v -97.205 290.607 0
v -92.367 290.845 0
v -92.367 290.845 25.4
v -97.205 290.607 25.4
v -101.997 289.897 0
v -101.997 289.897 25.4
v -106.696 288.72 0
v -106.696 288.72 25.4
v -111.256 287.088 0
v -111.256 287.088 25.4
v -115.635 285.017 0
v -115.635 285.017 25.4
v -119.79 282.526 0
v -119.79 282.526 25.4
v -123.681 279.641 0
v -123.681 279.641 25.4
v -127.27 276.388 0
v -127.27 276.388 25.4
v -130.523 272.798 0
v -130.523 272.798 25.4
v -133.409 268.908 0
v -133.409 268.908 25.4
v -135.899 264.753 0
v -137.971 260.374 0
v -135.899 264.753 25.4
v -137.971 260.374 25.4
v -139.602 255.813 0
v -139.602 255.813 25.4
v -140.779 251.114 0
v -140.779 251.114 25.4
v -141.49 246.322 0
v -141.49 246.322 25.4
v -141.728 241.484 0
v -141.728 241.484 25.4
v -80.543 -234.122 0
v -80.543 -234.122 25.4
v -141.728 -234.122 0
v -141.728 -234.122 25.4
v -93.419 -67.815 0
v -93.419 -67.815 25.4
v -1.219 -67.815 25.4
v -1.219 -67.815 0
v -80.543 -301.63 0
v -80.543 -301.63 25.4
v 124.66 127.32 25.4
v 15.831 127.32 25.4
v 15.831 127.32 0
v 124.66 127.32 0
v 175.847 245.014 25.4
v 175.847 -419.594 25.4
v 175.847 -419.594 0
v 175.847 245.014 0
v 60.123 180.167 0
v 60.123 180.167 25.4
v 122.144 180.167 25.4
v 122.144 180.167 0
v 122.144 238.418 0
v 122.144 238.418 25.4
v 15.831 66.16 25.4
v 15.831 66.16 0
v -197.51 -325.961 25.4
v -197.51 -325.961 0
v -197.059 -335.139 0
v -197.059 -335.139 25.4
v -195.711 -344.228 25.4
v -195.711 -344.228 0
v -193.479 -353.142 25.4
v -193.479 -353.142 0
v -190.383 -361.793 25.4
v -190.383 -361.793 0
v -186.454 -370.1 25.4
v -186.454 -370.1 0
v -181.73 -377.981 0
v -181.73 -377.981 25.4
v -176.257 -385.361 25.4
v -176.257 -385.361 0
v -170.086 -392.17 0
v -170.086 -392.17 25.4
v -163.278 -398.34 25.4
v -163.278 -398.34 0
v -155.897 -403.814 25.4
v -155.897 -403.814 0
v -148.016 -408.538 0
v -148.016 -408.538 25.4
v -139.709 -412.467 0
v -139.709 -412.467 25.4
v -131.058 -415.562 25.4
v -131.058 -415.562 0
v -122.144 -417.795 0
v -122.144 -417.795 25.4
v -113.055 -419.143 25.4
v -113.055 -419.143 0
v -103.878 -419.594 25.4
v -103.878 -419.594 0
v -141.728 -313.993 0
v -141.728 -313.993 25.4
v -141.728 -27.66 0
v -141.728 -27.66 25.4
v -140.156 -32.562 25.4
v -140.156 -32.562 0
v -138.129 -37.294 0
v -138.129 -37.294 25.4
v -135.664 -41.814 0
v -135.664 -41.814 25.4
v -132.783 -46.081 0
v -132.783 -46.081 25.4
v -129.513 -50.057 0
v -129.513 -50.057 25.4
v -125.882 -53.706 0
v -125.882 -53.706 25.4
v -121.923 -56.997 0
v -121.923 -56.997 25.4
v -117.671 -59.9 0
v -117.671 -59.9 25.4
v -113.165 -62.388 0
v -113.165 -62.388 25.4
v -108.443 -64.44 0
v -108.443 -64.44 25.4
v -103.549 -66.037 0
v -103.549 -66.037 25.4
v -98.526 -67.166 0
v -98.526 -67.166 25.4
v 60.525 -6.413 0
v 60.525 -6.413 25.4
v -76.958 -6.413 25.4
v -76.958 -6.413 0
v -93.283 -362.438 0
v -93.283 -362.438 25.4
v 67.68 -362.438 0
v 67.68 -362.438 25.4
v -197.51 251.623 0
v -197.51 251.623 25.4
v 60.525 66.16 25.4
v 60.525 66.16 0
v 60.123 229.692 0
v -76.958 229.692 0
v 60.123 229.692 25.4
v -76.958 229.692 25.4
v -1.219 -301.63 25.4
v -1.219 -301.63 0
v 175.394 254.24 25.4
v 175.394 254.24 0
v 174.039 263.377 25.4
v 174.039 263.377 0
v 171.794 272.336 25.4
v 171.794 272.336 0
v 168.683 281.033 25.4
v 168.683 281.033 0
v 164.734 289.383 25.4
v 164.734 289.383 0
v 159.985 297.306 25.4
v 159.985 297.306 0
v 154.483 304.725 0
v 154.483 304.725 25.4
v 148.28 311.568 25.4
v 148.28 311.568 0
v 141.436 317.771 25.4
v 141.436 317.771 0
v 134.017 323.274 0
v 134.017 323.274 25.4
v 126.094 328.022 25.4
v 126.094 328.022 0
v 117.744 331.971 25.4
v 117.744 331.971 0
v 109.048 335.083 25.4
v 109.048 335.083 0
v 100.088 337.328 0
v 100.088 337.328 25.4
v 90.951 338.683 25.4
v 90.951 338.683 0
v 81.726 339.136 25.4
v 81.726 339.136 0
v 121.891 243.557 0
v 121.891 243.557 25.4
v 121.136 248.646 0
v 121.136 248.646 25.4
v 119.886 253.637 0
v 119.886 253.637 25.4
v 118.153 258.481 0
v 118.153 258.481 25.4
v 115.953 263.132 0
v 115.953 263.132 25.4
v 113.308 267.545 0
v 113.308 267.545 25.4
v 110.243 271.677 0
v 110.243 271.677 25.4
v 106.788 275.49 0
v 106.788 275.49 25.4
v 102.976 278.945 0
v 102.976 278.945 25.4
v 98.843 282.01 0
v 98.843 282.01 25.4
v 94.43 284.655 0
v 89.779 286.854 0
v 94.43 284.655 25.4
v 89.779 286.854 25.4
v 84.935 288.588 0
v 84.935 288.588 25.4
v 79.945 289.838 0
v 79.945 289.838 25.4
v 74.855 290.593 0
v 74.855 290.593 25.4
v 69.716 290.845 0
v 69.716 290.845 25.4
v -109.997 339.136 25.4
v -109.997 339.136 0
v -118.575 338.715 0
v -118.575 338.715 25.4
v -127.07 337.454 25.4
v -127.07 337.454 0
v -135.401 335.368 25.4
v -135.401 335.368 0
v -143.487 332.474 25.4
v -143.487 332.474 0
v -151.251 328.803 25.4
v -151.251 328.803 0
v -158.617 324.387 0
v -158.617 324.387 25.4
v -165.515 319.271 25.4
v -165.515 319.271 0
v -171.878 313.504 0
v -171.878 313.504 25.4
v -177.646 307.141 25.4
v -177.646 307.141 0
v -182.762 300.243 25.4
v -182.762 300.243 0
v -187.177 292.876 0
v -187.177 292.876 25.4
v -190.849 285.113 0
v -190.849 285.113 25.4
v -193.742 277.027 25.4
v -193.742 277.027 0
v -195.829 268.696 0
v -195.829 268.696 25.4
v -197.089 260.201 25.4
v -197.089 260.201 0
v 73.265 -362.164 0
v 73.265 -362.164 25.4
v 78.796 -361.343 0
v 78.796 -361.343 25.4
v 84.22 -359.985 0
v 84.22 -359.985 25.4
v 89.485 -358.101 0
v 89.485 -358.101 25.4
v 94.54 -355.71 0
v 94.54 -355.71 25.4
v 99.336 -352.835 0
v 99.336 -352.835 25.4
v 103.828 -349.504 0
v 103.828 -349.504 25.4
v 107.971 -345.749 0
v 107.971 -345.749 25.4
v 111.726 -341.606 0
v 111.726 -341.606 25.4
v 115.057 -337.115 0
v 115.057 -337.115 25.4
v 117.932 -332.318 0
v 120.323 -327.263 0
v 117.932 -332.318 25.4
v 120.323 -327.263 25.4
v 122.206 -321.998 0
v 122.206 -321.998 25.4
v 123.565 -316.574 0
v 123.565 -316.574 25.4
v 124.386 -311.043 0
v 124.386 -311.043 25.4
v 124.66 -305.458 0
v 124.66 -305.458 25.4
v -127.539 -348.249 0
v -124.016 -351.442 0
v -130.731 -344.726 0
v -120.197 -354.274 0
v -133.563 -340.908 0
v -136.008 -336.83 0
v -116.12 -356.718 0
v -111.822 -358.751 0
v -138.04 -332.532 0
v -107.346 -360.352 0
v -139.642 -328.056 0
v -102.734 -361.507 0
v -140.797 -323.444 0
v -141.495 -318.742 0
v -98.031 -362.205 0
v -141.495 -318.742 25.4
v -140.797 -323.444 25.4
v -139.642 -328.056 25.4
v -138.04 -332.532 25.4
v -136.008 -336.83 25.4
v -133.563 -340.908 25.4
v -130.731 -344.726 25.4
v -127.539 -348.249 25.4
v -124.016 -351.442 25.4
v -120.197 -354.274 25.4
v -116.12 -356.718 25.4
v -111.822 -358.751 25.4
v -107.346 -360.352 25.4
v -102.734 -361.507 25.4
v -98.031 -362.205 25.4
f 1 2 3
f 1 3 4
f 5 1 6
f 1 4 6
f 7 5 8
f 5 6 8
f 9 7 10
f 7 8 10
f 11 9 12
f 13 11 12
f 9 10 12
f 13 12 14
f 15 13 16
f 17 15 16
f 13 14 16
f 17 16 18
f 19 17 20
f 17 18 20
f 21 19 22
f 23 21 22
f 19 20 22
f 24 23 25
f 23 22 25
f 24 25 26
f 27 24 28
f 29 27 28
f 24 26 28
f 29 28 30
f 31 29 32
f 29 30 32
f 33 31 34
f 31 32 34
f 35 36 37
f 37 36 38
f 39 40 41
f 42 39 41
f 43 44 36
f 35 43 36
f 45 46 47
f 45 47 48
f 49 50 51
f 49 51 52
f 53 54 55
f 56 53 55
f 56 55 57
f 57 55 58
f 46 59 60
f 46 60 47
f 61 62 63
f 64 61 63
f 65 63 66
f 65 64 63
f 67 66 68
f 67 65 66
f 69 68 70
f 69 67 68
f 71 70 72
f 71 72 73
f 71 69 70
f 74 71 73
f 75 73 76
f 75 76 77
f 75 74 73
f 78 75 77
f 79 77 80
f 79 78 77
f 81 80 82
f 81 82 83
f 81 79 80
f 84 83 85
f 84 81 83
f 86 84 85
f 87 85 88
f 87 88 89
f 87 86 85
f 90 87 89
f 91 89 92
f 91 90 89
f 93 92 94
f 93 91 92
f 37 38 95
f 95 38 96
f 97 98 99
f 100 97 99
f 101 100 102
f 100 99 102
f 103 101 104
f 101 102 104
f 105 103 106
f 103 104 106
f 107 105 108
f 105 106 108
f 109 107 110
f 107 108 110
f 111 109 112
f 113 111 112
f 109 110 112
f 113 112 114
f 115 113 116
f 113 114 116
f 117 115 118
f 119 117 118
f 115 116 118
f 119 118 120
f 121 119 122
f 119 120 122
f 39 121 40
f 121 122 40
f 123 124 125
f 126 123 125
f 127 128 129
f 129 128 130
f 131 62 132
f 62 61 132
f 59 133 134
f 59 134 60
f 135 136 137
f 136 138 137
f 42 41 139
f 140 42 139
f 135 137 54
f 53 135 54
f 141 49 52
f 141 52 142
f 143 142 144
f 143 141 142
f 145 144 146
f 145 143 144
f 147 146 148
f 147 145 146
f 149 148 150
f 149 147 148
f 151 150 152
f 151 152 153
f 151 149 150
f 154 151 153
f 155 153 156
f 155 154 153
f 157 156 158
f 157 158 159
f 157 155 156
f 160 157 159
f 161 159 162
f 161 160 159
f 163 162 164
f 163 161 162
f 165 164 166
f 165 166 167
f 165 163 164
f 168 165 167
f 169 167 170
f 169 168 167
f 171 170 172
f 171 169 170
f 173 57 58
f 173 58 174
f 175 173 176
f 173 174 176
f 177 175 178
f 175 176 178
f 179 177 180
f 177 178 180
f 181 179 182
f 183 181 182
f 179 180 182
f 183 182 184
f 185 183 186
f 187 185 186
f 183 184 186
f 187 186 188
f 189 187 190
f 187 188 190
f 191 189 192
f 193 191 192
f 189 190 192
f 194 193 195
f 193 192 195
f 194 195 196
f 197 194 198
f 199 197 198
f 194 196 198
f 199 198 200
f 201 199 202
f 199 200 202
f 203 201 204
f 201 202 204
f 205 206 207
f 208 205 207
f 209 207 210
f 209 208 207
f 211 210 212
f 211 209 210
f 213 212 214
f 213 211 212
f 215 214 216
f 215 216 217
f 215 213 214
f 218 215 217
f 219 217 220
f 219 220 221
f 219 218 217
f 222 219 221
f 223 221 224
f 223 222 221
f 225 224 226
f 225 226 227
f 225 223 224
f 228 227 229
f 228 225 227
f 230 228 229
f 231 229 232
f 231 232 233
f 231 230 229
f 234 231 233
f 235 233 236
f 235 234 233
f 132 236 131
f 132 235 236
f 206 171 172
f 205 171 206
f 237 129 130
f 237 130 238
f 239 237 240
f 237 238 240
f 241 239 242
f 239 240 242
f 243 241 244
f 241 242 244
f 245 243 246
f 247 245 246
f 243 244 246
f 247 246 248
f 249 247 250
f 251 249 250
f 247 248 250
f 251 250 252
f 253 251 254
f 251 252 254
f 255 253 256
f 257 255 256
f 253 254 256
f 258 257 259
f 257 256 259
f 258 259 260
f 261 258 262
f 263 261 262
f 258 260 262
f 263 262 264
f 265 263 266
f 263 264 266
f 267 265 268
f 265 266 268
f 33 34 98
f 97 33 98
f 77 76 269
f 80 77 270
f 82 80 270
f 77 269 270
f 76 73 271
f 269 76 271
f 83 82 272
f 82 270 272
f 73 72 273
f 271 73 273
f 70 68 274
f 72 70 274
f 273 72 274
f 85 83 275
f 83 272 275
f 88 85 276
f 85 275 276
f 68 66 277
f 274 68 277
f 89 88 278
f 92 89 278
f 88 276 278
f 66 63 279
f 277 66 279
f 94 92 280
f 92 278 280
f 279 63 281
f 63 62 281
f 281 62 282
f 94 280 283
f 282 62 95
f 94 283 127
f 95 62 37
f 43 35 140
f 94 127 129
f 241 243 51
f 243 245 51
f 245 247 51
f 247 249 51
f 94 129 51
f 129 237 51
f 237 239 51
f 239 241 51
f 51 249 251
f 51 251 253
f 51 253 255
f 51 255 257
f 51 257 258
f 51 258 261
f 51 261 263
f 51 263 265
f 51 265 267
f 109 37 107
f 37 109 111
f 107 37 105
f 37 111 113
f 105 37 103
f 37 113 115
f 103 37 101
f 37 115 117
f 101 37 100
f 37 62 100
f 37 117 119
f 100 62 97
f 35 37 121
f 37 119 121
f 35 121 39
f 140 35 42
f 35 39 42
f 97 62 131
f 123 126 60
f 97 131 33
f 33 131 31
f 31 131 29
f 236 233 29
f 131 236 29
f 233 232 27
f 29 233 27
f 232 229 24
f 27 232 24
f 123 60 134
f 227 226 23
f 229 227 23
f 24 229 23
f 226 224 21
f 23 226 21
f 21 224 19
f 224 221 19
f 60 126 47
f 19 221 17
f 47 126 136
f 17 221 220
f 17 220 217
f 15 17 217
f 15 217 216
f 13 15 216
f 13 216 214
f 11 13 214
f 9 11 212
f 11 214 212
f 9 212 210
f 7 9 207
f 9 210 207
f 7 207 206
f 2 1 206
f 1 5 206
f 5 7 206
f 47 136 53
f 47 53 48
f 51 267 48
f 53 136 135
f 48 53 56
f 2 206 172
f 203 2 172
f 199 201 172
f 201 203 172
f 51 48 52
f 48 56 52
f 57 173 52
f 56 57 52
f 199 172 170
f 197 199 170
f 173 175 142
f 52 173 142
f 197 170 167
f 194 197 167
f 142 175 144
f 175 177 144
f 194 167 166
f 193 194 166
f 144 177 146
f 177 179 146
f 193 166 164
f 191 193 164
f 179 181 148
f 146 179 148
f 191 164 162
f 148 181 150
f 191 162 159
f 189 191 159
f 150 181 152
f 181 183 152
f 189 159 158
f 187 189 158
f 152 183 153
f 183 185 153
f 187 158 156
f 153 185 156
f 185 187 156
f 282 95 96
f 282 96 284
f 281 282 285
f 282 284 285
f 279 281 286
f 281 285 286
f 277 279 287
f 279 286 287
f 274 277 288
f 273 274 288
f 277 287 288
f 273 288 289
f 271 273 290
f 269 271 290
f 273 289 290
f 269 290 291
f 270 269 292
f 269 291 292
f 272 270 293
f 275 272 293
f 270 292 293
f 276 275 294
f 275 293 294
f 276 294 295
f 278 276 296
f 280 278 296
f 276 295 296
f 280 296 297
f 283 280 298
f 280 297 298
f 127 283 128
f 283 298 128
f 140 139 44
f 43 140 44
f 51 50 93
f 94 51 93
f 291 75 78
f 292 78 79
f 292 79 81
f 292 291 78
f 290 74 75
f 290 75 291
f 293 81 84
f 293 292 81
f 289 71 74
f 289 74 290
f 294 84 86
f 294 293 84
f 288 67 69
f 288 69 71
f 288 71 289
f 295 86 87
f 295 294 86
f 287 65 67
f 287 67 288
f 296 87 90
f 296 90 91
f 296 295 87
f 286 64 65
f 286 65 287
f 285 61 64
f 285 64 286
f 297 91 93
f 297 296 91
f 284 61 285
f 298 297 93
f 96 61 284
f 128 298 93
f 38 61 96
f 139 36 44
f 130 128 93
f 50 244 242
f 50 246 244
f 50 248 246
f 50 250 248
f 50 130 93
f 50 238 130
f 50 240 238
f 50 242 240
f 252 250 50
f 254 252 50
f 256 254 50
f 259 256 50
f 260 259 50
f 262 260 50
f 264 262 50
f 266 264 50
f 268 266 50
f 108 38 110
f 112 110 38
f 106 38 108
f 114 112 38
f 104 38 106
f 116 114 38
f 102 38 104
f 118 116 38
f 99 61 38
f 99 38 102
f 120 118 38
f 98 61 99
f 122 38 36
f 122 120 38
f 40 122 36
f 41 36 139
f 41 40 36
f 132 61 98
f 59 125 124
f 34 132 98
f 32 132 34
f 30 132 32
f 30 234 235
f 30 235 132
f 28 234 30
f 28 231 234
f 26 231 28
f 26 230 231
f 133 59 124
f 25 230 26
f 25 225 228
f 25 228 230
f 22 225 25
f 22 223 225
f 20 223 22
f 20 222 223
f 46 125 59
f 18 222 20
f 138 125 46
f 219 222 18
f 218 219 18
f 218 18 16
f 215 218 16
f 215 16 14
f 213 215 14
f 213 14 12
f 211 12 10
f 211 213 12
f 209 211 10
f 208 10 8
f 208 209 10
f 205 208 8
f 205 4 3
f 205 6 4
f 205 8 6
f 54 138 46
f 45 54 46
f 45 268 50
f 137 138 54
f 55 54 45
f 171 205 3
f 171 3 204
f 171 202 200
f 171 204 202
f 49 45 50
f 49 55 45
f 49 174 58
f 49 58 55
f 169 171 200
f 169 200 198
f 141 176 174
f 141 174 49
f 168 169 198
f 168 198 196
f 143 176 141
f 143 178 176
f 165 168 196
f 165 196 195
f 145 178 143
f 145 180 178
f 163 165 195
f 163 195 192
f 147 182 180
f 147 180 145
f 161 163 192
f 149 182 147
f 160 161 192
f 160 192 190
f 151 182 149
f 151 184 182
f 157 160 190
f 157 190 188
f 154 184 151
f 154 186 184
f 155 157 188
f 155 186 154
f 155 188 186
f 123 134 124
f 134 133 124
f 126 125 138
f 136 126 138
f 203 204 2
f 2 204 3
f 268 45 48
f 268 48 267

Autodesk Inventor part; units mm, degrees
ref_plane "YZ Plane" through (0, 0, 0) normal (1, 0, 0) x (0, 1, 0)
ref_plane "XZ Plane" through (0, 0, 0) normal (0, 1, 0) x (-1, 0, 0)
ref_plane "XY Plane" through (0, 0, 0) normal (0, 0, 1) x (1, 0, 0)
sketch "Sketch1" plane through (0, 0, 0) normal (0, 0, 1) x (1, 0, 0)
  line L0 (381, -495.3) -> (-381, -495.3)
  line L1 (-381, -495.3) -> (-381, 495.3)
  line L2 (-381, 495.3) -> (381, 495.3)
  line L3 (381, 495.3) -> (381, -495.3)
  line L4 (381, -495.3) -> (-381, 495.3) construction
  line L5 (-381, -495.3) -> (381, 495.3) construction
  point P0 (0, 0)
  dimension "d0" = 762
  dimension "d1" = 990.6
extrude "Extrusion1" add sketch "Sketch1" along normal blind 25.4
sketch "Sketch2" plane through (0, 0, 25.4) normal (0, 0, 1) x (1, 0, 0)
  line L0 (-226.9738, 447.9746) -> (224.5353, 447.9746) construction
  line L1 (224.5353, 447.9746) -> (224.5353, -428.4841) construction
  line L2 (224.5353, -428.4841) -> (-226.9738, -428.4841) construction
  line L3 (-226.9738, -428.4841) -> (-226.9738, 447.9746) construction
  line L4 (175.8473, -419.5941) -> (175.8473, 245.0143)
  arc A0 (175.8473, 245.0143) -> (81.7255, 339.136) centre (81.7255, 245.0143) ccw
  line L5 (-226.9738, 0) -> (224.5353, 0)
  line L6 (81.7255, 339.136) -> (-0.7651, 339.136)
  line L7 (-1.2193, 447.9746) -> (-1.2193, -428.4841)
  line L8 (-0.7651, 339.136) -> (-109.9973, 339.136)
  line L9 (-197.5103, -325.9614) -> (-197.5103, 251.623)
  arc A1 (-109.9973, 339.136) -> (-197.5103, 251.623) centre (-109.9973, 251.623) ccw
  line L10 (175.8473, -419.5941) -> (-103.8776, -419.5941)
  arc A2 (-197.5103, -325.9614) -> (-103.8776, -419.5941) centre (-103.8776, -325.9614) ccw
  line L11 (60.5247, 66.1602) -> (15.8306, 66.1602)
  line L12 (15.8306, 66.1602) -> (15.8306, 127.3205)
  line L13 (15.8306, 127.3205) -> (124.6599, 127.3205)
  line L14 (124.6599, 127.3205) -> (124.6599, -305.458)
  line L15 (60.5247, 66.1602) -> (60.5247, -6.4131)
  line L16 (60.5247, -6.4131) -> (-76.9579, -6.4131)
  line L17 (-76.9579, -6.4131) -> (-76.9579, 229.6915)
  line L18 (-76.9579, 229.6915) -> (60.1228, 229.6915)
  line L19 (60.1228, 229.6915) -> (60.1228, 180.1667)
  line L20 (60.1228, 180.1667) -> (122.1436, 180.1667)
  line L21 (122.1436, 180.1667) -> (122.1436, 238.418)
  arc A3 (122.1436, 238.418) -> (69.7165, 290.8451) centre (69.7165, 238.418) ccw
  line L22 (69.7165, 290.8451) -> (-92.3667, 290.8451)
  arc A4 (-92.3667, 290.8451) -> (-141.7279, 241.4839) centre (-92.3667, 241.4839) ccw
  line L23 (-141.7279, 241.4839) -> (-141.7279, -27.6599)
  arc A5 (-141.7279, -27.6599) -> (-93.4193, -67.8148) centre (-89.1074, -13.4909) ccw
  line L24 (-93.4193, -67.8148) -> (58.494, -67.8148)
  line L25 (58.494, -67.8148) -> (58.494, -301.6299)
  line L26 (58.494, -301.6299) -> (-80.5428, -301.6299)
  line L27 (-80.5428, -301.6299) -> (-80.5428, -234.1224)
  line L28 (-80.5428, -234.1224) -> (-141.7279, -234.1224)
  line L29 (-141.7279, -234.1224) -> (-141.7279, -313.9932)
  arc A6 (-141.7279, -313.9932) -> (-93.2829, -362.4382) centre (-93.2829, -313.9932) ccw
  line L30 (-93.2829, -362.4382) -> (67.6797, -362.4382)
  arc A7 (67.6797, -362.4382) -> (124.6599, -305.458) centre (67.6797, -305.458) ccw
  line L31 (-141.7279, 241.4839) -> (-141.7279, 241.4839)
  line L32 (-381, 495.3) -> (-381, -495.3) projected
  line L33 (381, 495.3) -> (-381, 495.3) projected
  line L34 (381, -495.3) -> (381, 495.3) projected
  line L35 (-381, -495.3) -> (381, -495.3) projected
  point P0 (0, 0)
  point P1 (-1.2193, -67.8148)
  point P2 (-1.2193, -301.6299)
  dimension "d13" = 8.89
  dimension "d31" = 64.77
  dimension "d32" = 61.1536
extrude "Extrusion2" cut sketch "Sketch2" against normal up to surface (25.4 mm away) contours L14 A7 L30 L7 L26 L25 L24 L16 L15 L5 | L5 L15 L11 L12 L13 L14 | L30 A6 L29 L28 L27 L26 L7 | L7 L24 L25 L26 | L24 A5 L23 L5 L17 L16 L7 | L5 L23 A4 L22 L7 L18 L17 | L7 L22 A3 L21 L20 L19 L18 | L33 L34 L35 L32
